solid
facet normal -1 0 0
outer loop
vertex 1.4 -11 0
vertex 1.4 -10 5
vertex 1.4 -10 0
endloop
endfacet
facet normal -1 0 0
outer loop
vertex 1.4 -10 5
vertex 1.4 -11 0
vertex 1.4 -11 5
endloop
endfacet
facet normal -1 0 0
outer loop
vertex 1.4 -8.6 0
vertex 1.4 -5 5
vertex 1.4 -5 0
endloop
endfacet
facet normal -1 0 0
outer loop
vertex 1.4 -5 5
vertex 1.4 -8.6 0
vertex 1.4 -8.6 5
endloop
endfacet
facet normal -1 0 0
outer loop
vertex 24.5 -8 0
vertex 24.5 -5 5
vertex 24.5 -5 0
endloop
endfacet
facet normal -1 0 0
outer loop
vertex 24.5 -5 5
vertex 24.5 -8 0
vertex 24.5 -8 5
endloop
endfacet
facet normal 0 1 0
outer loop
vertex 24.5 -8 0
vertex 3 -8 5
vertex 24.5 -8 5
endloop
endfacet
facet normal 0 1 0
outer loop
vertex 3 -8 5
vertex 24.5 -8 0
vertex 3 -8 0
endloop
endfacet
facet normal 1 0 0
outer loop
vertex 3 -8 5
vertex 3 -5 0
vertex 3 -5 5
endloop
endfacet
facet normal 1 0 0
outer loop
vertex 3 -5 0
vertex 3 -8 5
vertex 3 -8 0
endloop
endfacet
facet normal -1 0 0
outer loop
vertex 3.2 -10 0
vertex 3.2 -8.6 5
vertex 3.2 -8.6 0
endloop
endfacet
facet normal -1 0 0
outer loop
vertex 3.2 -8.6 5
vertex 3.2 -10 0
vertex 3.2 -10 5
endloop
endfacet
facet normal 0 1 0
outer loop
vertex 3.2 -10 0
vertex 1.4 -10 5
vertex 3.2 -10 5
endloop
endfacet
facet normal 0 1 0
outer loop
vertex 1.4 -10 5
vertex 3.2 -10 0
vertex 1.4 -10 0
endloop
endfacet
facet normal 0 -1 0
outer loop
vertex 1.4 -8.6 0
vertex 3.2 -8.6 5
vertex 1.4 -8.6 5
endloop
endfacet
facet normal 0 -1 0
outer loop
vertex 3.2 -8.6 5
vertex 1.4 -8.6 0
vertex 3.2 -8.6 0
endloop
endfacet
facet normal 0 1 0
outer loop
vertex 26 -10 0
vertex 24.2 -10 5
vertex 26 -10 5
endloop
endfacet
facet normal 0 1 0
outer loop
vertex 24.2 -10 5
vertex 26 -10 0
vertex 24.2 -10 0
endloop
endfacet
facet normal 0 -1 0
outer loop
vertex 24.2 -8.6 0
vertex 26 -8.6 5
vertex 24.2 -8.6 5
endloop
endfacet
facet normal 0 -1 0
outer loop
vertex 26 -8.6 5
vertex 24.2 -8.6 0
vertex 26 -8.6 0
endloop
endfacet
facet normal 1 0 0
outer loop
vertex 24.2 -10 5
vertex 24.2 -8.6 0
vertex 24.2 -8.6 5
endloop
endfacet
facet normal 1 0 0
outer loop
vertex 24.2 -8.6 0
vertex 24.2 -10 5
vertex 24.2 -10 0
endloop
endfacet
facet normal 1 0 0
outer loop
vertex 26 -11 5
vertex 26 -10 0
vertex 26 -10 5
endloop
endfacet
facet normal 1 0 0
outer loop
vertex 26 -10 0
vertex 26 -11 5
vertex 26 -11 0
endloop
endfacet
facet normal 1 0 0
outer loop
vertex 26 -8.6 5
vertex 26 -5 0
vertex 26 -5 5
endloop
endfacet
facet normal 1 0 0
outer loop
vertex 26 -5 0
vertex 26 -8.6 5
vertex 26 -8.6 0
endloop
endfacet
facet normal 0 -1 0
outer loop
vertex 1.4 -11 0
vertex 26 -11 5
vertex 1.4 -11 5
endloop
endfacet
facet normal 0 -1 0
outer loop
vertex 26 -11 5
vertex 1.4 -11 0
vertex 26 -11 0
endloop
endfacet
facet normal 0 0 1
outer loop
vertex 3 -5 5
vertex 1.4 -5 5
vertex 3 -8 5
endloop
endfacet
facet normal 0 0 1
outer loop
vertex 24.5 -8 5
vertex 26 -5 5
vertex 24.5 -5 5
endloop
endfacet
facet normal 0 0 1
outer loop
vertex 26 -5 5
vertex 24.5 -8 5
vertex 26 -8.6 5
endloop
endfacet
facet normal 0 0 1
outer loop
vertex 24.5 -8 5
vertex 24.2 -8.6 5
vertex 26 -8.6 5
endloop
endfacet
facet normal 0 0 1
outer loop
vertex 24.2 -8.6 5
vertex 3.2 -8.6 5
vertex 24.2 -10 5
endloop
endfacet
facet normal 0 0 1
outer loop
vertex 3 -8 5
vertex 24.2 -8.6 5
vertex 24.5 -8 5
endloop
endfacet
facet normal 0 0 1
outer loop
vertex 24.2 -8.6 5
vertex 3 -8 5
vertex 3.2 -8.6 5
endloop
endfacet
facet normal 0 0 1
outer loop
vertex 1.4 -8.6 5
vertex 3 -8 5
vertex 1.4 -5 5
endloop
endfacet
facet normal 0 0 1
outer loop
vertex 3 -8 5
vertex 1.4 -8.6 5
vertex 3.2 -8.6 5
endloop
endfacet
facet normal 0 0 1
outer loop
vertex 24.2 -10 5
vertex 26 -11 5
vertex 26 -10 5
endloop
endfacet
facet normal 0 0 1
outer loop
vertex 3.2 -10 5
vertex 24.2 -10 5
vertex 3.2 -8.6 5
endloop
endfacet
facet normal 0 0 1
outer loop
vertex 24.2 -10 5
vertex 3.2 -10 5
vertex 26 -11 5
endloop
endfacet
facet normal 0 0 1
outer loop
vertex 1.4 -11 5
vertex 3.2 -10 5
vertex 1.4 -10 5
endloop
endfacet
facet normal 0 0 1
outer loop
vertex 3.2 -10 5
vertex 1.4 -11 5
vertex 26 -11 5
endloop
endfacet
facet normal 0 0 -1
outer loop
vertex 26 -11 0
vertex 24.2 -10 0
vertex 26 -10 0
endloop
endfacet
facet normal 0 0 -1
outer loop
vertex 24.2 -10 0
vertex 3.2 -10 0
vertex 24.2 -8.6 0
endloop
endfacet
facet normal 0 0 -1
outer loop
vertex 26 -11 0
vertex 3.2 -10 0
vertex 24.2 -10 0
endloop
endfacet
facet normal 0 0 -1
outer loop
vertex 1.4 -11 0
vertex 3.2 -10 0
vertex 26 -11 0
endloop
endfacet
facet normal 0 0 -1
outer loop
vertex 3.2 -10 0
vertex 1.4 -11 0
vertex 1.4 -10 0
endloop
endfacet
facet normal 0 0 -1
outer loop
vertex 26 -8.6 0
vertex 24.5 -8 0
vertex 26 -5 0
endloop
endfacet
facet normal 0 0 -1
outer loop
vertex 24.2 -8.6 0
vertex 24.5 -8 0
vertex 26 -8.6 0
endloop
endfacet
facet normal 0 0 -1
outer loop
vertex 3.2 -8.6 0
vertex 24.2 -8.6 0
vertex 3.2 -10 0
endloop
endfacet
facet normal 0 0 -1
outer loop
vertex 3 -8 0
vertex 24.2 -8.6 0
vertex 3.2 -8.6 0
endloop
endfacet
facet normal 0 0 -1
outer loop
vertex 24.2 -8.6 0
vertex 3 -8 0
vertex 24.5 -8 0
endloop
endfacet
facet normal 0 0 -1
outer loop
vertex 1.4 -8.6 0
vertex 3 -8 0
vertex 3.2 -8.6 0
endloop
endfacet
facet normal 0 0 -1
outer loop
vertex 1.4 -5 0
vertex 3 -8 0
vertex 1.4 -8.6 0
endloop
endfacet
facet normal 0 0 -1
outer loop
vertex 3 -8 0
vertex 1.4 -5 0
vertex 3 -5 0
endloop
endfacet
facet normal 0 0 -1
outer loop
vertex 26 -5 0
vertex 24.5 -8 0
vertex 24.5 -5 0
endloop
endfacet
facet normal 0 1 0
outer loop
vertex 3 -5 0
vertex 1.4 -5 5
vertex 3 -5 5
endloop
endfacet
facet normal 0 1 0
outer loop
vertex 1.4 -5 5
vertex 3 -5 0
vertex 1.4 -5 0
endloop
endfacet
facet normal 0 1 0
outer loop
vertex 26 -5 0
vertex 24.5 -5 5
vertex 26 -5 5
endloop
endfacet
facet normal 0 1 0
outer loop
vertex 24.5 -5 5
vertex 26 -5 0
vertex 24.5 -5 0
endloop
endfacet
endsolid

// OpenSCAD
outerWallThickness=1.4;
aluminumXThickness=27.4;
aluminumZHeight=18.25;
topLipZ=3;
topLipX=3;
innerRailX=3.2;
innerRailZ=1.4	;

railLength=60;

rotate([90,0,0]) 

difference(){
	translate([outerWallThickness,0,0]) cube([aluminumXThickness-2*outerWallThickness,5,11]);

	//Clean rail guide at bottom
	translate([10,-1,0]) cube([10,60,6]);

	//Get clean edges
	translate([-1,-1,-1]) cube([aluminumXThickness+10,60,6]);

//Get frame	 guide
translate([0,-1,0]) union(){
	difference(){
		cube([aluminumXThickness,railLength,aluminumZHeight]);

		//Full Channel Gap
		translate([outerWallThickness,-1,6]) cube([25,railLength+10,20]);
		
		//Bottom Gap
		translate([outerWallThickness,-1,4.15]) cube([25,railLength+10,5]);	
		
		//Middle Gap
		translate([outerWallThickness,-1,10.15]) cube([25,railLength+10,2]);	
		
		//Bottom Guide
		translate([10.6,-1,0.8]) cube([5.8,railLength+10,5]);
		translate([11.5,-1,-1]) cube([4.03,railLength+10,5]);
		
	};

	//Bottom Rails
	difference(){
		translate([3,0,0]) cube([21.5,railLength,8]);
		//Bottom Guide
		translate([10.6,-1,0.8]) cube([5.8,railLength+10,5]);
		translate([11.5,-1,-1]) cube([4.03,railLength+10,5]);
	};

	//Left Rails
	//Bottom
	translate([0,0,10-innerRailZ]) cube([innerRailX,railLength,innerRailZ]);

	//Middle
	translate([0,0,13-innerRailZ]) cube([innerRailX,railLength,innerRailZ]);

	//Top
	translate([0,0,aluminumZHeight-topLipZ]) cube([topLipX,railLength,topLipZ]);

	//Right Rails
	//Bottom
	translate([aluminumXThickness-innerRailX,0,10-innerRailZ]) cube([innerRailX,railLength,innerRailZ]);

	//Middle
	translate([aluminumXThickness-innerRailX,0,13-innerRailZ]) cube([innerRailX,railLength,innerRailZ]);

	//Top
	translate([aluminumXThickness-topLipX,0,aluminumZHeight-topLipZ]) cube([topLipX,railLength,topLipZ]);
};


};
